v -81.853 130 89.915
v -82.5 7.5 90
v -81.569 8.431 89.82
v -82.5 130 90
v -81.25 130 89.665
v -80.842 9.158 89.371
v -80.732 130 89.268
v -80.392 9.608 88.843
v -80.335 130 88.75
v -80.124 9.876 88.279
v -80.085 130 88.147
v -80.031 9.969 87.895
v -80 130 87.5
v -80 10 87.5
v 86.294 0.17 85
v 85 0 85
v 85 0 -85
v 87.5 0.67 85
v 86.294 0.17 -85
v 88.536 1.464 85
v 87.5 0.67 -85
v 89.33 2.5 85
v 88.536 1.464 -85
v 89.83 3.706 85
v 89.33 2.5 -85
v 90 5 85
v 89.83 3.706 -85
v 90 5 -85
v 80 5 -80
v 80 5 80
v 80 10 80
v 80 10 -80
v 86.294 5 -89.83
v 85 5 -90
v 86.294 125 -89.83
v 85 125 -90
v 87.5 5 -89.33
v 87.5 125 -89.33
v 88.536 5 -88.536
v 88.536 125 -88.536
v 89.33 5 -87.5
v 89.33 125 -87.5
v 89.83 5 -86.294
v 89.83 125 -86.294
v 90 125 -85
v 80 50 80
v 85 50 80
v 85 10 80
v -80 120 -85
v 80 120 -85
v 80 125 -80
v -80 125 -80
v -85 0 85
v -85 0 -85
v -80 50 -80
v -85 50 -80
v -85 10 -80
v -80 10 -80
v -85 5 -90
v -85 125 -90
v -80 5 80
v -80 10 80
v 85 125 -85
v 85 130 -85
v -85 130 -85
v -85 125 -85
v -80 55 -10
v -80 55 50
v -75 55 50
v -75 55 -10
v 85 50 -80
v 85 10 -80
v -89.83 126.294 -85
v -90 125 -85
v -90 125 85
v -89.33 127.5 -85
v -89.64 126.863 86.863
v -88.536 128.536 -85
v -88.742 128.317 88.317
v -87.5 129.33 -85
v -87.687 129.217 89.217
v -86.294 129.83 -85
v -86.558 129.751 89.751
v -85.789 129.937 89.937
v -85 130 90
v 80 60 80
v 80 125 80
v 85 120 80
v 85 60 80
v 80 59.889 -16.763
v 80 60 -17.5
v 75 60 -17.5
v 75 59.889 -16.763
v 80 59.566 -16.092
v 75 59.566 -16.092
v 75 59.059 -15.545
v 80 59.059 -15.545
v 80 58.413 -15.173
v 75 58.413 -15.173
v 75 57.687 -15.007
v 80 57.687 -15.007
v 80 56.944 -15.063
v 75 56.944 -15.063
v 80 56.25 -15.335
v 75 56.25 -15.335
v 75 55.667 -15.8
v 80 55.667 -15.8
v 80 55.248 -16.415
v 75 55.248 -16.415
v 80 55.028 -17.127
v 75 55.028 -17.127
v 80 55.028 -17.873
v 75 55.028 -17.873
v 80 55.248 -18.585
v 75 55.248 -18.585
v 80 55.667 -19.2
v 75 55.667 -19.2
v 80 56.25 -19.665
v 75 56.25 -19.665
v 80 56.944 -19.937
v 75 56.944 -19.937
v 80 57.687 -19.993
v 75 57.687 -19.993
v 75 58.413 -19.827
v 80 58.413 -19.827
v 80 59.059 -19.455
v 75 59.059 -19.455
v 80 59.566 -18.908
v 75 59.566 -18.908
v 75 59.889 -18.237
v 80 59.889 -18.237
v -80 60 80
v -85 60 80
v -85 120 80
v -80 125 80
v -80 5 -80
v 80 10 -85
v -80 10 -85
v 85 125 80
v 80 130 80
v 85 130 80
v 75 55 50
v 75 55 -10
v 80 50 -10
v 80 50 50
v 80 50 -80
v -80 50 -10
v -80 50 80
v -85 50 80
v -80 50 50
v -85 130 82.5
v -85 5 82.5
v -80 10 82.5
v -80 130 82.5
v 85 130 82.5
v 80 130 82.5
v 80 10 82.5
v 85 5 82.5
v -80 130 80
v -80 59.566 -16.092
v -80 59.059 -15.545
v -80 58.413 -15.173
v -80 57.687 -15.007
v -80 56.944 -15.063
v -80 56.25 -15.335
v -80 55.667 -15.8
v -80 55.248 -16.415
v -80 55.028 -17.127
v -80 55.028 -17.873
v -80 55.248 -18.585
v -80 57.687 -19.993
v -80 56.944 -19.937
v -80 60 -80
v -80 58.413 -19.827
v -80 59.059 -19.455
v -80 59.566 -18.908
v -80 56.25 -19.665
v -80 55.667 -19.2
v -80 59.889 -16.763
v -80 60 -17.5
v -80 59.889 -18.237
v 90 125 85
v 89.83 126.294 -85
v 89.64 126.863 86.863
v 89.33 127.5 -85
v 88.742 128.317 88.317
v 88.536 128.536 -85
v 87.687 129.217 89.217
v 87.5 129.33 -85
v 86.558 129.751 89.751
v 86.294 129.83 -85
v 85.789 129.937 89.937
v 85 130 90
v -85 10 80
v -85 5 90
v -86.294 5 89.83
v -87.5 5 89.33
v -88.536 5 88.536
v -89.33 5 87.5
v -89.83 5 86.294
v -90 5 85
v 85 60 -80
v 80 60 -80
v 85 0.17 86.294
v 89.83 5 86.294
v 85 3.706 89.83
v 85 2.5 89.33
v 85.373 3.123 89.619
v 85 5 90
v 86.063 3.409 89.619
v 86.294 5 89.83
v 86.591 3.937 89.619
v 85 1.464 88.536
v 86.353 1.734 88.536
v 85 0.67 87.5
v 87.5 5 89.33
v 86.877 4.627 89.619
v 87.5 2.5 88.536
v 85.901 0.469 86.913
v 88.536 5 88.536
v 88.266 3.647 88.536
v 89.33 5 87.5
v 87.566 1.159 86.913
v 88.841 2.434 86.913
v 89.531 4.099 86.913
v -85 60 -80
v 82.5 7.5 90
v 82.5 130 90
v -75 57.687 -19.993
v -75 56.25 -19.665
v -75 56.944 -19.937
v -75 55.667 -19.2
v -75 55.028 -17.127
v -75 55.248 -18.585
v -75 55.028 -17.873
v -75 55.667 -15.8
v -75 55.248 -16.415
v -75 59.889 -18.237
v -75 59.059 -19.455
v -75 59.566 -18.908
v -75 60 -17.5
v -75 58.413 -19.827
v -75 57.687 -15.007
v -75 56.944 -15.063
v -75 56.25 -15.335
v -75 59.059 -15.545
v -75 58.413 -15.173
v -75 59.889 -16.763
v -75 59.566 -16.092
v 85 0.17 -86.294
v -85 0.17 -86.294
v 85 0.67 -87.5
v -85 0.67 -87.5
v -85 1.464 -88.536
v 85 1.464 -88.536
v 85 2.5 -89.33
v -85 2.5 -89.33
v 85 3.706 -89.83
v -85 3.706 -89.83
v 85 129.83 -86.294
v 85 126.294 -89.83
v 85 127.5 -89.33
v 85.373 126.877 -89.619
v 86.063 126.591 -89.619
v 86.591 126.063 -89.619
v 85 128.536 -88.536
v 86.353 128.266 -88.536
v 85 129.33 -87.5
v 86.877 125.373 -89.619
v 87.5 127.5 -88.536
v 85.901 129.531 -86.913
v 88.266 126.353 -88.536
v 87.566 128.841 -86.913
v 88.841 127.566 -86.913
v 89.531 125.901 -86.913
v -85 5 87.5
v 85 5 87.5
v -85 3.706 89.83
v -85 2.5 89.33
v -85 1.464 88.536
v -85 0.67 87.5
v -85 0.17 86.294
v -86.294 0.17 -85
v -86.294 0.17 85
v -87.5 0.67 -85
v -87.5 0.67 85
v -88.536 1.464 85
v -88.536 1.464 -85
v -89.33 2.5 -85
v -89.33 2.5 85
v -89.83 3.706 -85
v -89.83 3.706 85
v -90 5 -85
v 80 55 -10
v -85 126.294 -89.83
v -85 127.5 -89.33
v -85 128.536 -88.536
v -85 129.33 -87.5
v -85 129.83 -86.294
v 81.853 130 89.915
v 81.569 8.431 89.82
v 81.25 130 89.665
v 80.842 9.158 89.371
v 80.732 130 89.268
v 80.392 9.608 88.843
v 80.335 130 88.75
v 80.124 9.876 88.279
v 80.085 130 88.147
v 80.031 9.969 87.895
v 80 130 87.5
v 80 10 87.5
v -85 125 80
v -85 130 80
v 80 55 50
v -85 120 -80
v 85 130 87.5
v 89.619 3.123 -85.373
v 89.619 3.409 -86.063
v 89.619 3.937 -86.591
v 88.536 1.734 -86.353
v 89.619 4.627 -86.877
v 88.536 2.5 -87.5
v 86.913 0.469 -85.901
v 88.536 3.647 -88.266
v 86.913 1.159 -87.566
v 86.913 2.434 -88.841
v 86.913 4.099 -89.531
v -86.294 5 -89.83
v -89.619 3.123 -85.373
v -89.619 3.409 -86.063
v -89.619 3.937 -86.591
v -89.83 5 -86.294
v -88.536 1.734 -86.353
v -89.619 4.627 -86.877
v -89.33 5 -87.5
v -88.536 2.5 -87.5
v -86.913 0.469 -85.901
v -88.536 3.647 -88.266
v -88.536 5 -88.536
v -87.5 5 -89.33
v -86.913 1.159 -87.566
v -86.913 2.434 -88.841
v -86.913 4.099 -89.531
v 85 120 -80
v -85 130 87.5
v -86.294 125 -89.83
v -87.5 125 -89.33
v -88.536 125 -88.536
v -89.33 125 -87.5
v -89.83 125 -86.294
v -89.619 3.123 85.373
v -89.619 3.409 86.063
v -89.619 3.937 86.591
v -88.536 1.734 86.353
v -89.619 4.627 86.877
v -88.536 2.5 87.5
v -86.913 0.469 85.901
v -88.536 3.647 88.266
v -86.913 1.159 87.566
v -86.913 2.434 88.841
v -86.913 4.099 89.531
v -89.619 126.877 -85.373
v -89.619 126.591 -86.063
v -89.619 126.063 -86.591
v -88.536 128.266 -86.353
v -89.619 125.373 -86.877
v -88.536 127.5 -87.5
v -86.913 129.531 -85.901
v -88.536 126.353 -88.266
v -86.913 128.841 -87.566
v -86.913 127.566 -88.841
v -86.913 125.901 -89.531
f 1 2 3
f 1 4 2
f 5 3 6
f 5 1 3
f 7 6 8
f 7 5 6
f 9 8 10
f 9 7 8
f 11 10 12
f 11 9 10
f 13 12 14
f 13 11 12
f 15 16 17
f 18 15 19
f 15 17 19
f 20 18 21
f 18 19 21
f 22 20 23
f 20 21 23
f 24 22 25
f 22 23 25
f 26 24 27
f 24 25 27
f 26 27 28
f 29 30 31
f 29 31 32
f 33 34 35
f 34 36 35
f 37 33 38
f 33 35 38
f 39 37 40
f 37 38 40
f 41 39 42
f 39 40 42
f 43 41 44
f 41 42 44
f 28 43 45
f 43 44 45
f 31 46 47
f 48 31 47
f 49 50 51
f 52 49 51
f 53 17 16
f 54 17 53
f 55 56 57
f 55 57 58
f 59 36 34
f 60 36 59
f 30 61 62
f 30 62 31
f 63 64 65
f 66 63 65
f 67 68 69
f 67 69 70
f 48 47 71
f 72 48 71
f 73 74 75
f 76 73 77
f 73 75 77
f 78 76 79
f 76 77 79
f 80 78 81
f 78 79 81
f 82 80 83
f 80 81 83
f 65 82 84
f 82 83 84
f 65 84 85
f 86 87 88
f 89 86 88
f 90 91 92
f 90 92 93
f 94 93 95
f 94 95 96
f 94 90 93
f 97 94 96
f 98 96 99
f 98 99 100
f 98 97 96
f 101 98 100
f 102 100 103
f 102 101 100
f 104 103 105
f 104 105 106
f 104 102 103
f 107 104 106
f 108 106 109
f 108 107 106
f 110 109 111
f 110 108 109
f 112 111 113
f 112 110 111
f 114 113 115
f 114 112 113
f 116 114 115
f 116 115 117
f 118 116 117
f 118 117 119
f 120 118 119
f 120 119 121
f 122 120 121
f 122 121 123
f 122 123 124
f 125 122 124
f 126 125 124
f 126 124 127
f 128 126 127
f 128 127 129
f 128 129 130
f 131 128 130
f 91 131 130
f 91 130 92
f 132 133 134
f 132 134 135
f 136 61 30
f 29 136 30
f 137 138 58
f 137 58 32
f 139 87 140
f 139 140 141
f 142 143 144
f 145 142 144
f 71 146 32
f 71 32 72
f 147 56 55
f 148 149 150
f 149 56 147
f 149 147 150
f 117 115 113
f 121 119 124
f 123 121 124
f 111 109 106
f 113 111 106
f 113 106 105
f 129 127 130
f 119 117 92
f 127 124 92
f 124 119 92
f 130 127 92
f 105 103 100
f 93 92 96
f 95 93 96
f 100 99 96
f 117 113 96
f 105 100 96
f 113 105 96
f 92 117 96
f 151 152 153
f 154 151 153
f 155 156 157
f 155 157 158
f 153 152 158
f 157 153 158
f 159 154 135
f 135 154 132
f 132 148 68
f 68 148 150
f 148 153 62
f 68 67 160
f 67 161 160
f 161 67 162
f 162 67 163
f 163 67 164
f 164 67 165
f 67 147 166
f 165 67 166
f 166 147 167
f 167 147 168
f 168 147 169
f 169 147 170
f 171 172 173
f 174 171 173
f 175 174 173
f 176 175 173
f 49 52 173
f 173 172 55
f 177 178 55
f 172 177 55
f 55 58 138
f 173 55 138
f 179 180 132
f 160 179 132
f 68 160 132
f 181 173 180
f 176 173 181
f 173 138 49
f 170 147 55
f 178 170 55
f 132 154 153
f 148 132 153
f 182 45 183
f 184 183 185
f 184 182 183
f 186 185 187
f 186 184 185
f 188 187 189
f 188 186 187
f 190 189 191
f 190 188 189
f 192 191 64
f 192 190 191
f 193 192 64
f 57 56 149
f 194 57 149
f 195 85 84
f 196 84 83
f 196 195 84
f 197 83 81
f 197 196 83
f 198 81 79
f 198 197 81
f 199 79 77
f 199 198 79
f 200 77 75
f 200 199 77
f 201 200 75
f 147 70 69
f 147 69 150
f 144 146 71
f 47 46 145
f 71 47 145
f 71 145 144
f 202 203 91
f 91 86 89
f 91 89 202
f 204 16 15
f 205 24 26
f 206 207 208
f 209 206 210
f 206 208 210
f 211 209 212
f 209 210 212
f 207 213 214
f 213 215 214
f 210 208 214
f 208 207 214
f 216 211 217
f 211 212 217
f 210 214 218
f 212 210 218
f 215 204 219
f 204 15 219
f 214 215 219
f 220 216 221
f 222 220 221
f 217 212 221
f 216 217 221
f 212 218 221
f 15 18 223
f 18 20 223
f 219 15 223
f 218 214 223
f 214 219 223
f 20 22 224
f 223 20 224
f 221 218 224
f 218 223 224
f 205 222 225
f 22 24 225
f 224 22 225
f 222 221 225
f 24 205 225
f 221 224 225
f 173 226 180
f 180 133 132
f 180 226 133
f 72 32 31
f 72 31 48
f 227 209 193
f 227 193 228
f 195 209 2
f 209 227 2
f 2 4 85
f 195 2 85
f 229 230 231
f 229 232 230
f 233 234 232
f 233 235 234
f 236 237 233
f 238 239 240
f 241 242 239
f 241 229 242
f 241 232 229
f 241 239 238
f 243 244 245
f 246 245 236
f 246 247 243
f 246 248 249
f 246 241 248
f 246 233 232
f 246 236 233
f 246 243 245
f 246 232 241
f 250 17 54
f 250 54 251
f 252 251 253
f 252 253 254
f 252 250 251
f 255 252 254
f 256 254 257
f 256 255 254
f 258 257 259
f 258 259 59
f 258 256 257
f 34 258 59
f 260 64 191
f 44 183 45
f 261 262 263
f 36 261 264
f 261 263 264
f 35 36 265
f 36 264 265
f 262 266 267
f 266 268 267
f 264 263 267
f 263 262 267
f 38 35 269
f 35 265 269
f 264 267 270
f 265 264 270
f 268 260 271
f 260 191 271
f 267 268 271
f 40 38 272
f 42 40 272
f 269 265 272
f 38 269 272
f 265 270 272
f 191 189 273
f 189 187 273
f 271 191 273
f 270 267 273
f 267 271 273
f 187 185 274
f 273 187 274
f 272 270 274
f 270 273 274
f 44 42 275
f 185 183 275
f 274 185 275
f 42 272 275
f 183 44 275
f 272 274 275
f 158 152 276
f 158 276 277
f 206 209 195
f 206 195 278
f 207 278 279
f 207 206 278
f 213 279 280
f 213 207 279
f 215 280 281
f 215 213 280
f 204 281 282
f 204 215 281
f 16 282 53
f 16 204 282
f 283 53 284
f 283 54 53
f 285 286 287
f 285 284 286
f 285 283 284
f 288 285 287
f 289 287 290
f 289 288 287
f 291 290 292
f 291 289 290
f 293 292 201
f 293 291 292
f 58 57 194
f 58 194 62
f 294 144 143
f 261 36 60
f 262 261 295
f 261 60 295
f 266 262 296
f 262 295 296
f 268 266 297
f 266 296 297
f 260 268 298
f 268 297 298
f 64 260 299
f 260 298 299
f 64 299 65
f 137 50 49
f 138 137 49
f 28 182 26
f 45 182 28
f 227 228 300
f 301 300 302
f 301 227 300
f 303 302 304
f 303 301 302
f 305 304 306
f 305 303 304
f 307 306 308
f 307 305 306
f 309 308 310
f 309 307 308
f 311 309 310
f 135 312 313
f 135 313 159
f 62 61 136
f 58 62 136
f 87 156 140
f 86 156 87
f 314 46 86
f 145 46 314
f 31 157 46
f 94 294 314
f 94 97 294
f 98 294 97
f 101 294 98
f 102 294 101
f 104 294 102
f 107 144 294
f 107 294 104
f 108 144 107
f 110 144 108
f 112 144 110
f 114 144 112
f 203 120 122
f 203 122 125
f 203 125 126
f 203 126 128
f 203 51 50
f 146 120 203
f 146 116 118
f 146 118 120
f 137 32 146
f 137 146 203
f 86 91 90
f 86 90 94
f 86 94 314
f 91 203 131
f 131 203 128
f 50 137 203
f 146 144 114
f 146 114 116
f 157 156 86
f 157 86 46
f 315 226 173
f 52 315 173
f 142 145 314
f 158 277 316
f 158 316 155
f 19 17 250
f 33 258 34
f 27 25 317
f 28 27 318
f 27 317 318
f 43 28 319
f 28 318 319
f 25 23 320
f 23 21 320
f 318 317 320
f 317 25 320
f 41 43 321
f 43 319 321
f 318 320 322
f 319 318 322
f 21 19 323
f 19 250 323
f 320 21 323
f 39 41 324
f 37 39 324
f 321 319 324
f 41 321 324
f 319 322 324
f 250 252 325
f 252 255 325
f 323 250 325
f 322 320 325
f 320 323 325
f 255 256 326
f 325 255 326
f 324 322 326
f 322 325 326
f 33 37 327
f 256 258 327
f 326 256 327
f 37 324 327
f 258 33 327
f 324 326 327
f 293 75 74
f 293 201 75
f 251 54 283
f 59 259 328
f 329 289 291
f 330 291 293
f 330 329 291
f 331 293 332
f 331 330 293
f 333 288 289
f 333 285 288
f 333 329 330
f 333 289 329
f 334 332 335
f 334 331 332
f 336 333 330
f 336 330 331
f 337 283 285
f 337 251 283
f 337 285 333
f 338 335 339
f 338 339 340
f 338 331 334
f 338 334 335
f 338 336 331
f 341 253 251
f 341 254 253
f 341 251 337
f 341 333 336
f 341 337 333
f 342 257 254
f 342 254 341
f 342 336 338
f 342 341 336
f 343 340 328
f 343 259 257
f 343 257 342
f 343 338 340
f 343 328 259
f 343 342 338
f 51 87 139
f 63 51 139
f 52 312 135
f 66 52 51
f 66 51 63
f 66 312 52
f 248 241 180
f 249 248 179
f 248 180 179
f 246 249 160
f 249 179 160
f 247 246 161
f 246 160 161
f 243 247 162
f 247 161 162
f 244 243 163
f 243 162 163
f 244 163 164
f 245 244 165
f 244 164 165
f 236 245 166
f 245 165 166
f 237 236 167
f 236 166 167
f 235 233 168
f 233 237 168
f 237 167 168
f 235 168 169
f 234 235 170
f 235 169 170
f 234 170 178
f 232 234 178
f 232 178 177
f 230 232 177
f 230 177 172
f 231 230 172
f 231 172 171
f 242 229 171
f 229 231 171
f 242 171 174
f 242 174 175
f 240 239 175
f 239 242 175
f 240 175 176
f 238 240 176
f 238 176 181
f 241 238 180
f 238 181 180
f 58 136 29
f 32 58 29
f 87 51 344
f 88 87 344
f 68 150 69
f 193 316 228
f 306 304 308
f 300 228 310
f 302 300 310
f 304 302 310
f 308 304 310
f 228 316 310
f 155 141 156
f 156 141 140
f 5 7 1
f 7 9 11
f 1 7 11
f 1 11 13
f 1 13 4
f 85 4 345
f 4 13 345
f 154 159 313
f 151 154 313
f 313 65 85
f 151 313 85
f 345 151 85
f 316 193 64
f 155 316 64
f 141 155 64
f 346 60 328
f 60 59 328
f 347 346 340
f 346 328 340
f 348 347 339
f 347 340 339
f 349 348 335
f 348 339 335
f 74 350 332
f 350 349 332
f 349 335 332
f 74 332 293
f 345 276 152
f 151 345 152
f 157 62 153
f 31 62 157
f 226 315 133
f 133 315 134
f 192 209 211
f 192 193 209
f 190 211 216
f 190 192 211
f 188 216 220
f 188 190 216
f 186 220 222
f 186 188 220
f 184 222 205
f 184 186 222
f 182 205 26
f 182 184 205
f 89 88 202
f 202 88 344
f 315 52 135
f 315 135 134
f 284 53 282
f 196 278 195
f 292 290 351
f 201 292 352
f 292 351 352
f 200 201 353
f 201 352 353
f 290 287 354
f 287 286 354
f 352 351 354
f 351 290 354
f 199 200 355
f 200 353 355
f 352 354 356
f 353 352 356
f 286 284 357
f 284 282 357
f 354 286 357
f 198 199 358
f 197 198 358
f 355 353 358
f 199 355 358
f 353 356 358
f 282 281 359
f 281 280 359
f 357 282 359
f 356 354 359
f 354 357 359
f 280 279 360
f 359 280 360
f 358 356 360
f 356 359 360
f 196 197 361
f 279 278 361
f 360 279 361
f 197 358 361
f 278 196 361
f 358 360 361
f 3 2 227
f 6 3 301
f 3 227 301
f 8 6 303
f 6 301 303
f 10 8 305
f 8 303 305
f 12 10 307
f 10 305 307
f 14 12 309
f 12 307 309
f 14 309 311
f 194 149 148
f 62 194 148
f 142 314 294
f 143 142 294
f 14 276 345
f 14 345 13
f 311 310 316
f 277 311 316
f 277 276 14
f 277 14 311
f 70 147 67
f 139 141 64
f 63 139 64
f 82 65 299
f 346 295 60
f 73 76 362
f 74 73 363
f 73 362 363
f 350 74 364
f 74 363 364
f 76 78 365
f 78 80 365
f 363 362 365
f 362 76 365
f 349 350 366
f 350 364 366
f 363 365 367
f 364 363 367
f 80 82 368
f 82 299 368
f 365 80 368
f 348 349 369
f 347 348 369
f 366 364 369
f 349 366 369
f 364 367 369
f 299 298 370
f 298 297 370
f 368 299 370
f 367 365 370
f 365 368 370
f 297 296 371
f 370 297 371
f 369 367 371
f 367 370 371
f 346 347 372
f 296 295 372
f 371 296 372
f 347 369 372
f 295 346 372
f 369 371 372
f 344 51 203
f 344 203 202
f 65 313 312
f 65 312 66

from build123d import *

# Parameters (mm, degrees)
SKETCH5_W               = 180
SKETCH5_H               = 180
SKETCH5_W_2             = 160
SKETCH5_H_2             = 160
BOSS_EXTRUDE5_DEPTH     = 10
SKETCH6_W               = 10
SKETCH6_H               = 10
BOSS_EXTRUDE6_DEPTH     = 120
SKETCH7_W               = 10
SKETCH7_H               = 10
BOSS_EXTRUDE7_DEPTH     = 177.77027879
SKETCH10_R              = 2.5
SKETCH10_W              = 60
SKETCH10_H              = 5
BOSS_EXTRUDE9_DEPTH     = 5
CUT_EXTRUDE1_DEPTH      = 212.187120819
SKETCH12_W              = 160
SKETCH12_H              = 160
BOSS_EXTRUDE10_DEPTH    = 5
SKETCH14_W              = 160
SKETCH14_H              = 120
BOSS_EXTRUDE12_DEPTH    = 5
BOSS_EXTRUDE13_DEPTH    = 170.97785486
SKETCH16_W              = 160
SKETCH16_H              = 120
BOSS_EXTRUDE14_DEPTH    = 5
SKETCH17_W              = 160
SKETCH17_H              = 120
BOSS_EXTRUDE15_DEPTH    = 5
CUT_EXTRUDE2_DEPTH      = 182.934053987
CUT_EXTRUDE2_DEPTH_BACK = 125
SKETCH18_W              = 170
SKETCH18_H              = 5
BOSS_EXTRUDE16_REACH    = 234.164
SKETCH20_W              = 5
SKETCH20_H              = 5
CUT_EXTRUDE4_DEPTH      = 5
FILLET4_R               = 5
FILLET6_R               = 2.5
SKETCH9_W               = 160
SKETCH9_H               = 160
BOSS_EXTRUDE8_DEPTH     = 5


with BuildPart() as part:
    # Sketch5 → Boss-Extrude5 (new body)
    with BuildSketch(Plane(origin=(0, 0, 0), x_dir=(1, 0, 0), z_dir=(0, 1, 0))):
        Rectangle(SKETCH5_W, SKETCH5_H)
        Rectangle(SKETCH5_W_2, SKETCH5_H_2, mode=Mode.SUBTRACT)
    extrude(amount=BOSS_EXTRUDE5_DEPTH)

    # Sketch6 → Boss-Extrude6 (add)
    with BuildSketch(Plane(origin=(0, 10, 0), x_dir=(1, 0, 0), z_dir=(0, 1, 0))):
        with Locations((85, -85)):
            Rectangle(SKETCH6_W, SKETCH6_H)
        with Locations((85, 85)):
            Rectangle(SKETCH6_W, SKETCH6_H)
        with Locations((-85, 85)):
            Rectangle(SKETCH6_W, SKETCH6_H)
        with Locations((-85, -85)):
            Rectangle(SKETCH6_W, SKETCH6_H)
    extrude(amount=BOSS_EXTRUDE6_DEPTH)

    # Sketch7 → Boss-Extrude7 (add)
    with BuildSketch(Plane.XY.offset(90)):
        with Locations((85, 55)):
            Rectangle(SKETCH7_W, SKETCH7_H)
        with Locations((-85, 55)):
            Rectangle(SKETCH7_W, SKETCH7_H)
    extrude(amount=-BOSS_EXTRUDE7_DEPTH)

    # Sketch10 → Boss-Extrude9 (add)
    with BuildSketch(Plane(origin=(-80, 0, 0), x_dir=(0, 0, -1), z_dir=(1, 0, 0))):
        with Locations(Location((17.5, 57.5, 0), (0, 0, 90))):
            Circle(SKETCH10_R)
        with Locations((-20, 52.5)):
            Rectangle(SKETCH10_W, SKETCH10_H)
    boss_extrude9 = extrude(amount=BOSS_EXTRUDE9_DEPTH)

    # Sketch11 → Cut-Extrude1 (cut, symmetric)
    with BuildSketch(Plane.XY.offset(50)):
        Polygon((-75, 55), (-80, 50), (-75, 50), align=None)
    cut_extrude1 = extrude(amount=CUT_EXTRUDE1_DEPTH, both=True, mode=Mode.SUBTRACT)

    # Mirror1: Boss-Extrude9, Cut-Extrude1 across plane
    add(boss_extrude9.mirror(Plane(origin=(0, 0, 0), x_dir=(0, 0, 1), z_dir=(1, 0, 0))))
    add(cut_extrude1.mirror(Plane(origin=(0, 0, 0), x_dir=(0, 0, 1), z_dir=(1, 0, 0))), mode=Mode.SUBTRACT)

    # Sketch12 → Boss-Extrude10 (add)
    with BuildSketch(Plane.XZ):
        Rectangle(SKETCH12_W, SKETCH12_H)
    extrude(amount=-BOSS_EXTRUDE10_DEPTH)

    # Sketch14 → Boss-Extrude12 (add)
    with BuildSketch(Plane(origin=(0, 0, -90), x_dir=(-1, 0, 0), z_dir=(0, 0, -1))):
        with Locations((0, 70)):
            Rectangle(SKETCH14_W, SKETCH14_H)
    extrude(amount=-BOSS_EXTRUDE12_DEPTH)

    # Sketch15 → Boss-Extrude13 (add)
    with BuildSketch(Plane.XY.offset(90)):
        Polygon((-90, 125), (-80, 125), (-90, 115), align=None)
        Polygon((90, 115), (90, 125), (80, 125), align=None)
    extrude(amount=-BOSS_EXTRUDE13_DEPTH)

    # Sketch16 → Boss-Extrude14 (add)
    with BuildSketch(Plane(origin=(90, 0, 0), x_dir=(0, 0, -1), z_dir=(1, 0, 0))):
        with Locations((0, 70)):
            Rectangle(SKETCH16_W, SKETCH16_H)
    extrude(amount=-BOSS_EXTRUDE14_DEPTH)

    # Sketch17 → Boss-Extrude15 (add)
    with BuildSketch(Plane.ZY.offset(90)):
        with Locations((0, 70)):
            Rectangle(SKETCH17_W, SKETCH17_H)
    extrude(amount=-BOSS_EXTRUDE15_DEPTH)

    # Sketch18 → Cut-Extrude2 (cut, two sides: drawn at the far end of the back side and taken through both)
    with BuildSketch(Plane(origin=(0, 130, 0), x_dir=(1, 0, 0), z_dir=(0, 1, 0)).offset(-CUT_EXTRUDE2_DEPTH_BACK)):
        with Locations((0, -85)):
            Rectangle(SKETCH18_W, SKETCH18_H)
    extrude(amount=CUT_EXTRUDE2_DEPTH + CUT_EXTRUDE2_DEPTH_BACK, mode=Mode.SUBTRACT)

    # Sketch19 → Boss-Extrude16 (add, up to next)
    with BuildSketch(Plane(origin=(-80, 0, 0), x_dir=(0, 0, -1), z_dir=(1, 0, 0)), mode=Mode.PRIVATE) as boss_extrude16_sk1:
        Polygon((80, 125), (85, 125), (85, 120), align=None)
    boss_extrude16_tool1 = extrude(boss_extrude16_sk1.sketch, amount=BOSS_EXTRUDE16_REACH, mode=Mode.PRIVATE) - part.part
    add(boss_extrude16_tool1.solids().sort_by_distance((-80, 123.333333, -83.333333))[0])

    # Sketch20 → Cut-Extrude4 (cut)
    with BuildSketch(Plane(origin=(0, 130, 0), x_dir=(1, 0, 0), z_dir=(0, 1, 0))):
        with Locations((-82.5, 82.5)):
            Rectangle(SKETCH20_W, SKETCH20_H)
        with Locations((82.5, 82.5)):
            Rectangle(SKETCH20_W, SKETCH20_H)
    extrude(amount=-CUT_EXTRUDE4_DEPTH, mode=Mode.SUBTRACT)

    # Fillet4
    fillet4_edges = [part.edges().sort_by_distance(p)[0] for p in [
        (90, 130, 0),
        (0, 130, -90),
        (0, 0, -90),
        (-90, 130, 0),
        (90, 0, 0),
        (0, 0, 90),
        (-90, 0, 0),
        (-90, 65, -90),
        (90, 65, -90),
        (90, 65, 90),
        (-90, 65, 90),
    ]]
    fillet(fillet4_edges, radius=FILLET4_R - 0.0001)  # a hair under: the kernel refuses the full size

    # Fillet6
    fillet6_edges = [part.edges().sort_by_distance(p)[0] for p in [
        (-80, 70, 90),
        (80, 70, 90),
        (0, 10, 90),
    ]]
    fillet(fillet6_edges, radius=FILLET6_R - 0.0001)  # a hair under: the kernel refuses the full size

    # Sketch9 → Boss-Extrude8 (add)
    with BuildSketch(Plane(origin=(0, 0, 0), x_dir=(-1, 0, 0), z_dir=(0, -1, 0))):
        Rectangle(SKETCH9_W, SKETCH9_H)
    extrude(amount=-BOSS_EXTRUDE8_DEPTH)


solid = part.part
